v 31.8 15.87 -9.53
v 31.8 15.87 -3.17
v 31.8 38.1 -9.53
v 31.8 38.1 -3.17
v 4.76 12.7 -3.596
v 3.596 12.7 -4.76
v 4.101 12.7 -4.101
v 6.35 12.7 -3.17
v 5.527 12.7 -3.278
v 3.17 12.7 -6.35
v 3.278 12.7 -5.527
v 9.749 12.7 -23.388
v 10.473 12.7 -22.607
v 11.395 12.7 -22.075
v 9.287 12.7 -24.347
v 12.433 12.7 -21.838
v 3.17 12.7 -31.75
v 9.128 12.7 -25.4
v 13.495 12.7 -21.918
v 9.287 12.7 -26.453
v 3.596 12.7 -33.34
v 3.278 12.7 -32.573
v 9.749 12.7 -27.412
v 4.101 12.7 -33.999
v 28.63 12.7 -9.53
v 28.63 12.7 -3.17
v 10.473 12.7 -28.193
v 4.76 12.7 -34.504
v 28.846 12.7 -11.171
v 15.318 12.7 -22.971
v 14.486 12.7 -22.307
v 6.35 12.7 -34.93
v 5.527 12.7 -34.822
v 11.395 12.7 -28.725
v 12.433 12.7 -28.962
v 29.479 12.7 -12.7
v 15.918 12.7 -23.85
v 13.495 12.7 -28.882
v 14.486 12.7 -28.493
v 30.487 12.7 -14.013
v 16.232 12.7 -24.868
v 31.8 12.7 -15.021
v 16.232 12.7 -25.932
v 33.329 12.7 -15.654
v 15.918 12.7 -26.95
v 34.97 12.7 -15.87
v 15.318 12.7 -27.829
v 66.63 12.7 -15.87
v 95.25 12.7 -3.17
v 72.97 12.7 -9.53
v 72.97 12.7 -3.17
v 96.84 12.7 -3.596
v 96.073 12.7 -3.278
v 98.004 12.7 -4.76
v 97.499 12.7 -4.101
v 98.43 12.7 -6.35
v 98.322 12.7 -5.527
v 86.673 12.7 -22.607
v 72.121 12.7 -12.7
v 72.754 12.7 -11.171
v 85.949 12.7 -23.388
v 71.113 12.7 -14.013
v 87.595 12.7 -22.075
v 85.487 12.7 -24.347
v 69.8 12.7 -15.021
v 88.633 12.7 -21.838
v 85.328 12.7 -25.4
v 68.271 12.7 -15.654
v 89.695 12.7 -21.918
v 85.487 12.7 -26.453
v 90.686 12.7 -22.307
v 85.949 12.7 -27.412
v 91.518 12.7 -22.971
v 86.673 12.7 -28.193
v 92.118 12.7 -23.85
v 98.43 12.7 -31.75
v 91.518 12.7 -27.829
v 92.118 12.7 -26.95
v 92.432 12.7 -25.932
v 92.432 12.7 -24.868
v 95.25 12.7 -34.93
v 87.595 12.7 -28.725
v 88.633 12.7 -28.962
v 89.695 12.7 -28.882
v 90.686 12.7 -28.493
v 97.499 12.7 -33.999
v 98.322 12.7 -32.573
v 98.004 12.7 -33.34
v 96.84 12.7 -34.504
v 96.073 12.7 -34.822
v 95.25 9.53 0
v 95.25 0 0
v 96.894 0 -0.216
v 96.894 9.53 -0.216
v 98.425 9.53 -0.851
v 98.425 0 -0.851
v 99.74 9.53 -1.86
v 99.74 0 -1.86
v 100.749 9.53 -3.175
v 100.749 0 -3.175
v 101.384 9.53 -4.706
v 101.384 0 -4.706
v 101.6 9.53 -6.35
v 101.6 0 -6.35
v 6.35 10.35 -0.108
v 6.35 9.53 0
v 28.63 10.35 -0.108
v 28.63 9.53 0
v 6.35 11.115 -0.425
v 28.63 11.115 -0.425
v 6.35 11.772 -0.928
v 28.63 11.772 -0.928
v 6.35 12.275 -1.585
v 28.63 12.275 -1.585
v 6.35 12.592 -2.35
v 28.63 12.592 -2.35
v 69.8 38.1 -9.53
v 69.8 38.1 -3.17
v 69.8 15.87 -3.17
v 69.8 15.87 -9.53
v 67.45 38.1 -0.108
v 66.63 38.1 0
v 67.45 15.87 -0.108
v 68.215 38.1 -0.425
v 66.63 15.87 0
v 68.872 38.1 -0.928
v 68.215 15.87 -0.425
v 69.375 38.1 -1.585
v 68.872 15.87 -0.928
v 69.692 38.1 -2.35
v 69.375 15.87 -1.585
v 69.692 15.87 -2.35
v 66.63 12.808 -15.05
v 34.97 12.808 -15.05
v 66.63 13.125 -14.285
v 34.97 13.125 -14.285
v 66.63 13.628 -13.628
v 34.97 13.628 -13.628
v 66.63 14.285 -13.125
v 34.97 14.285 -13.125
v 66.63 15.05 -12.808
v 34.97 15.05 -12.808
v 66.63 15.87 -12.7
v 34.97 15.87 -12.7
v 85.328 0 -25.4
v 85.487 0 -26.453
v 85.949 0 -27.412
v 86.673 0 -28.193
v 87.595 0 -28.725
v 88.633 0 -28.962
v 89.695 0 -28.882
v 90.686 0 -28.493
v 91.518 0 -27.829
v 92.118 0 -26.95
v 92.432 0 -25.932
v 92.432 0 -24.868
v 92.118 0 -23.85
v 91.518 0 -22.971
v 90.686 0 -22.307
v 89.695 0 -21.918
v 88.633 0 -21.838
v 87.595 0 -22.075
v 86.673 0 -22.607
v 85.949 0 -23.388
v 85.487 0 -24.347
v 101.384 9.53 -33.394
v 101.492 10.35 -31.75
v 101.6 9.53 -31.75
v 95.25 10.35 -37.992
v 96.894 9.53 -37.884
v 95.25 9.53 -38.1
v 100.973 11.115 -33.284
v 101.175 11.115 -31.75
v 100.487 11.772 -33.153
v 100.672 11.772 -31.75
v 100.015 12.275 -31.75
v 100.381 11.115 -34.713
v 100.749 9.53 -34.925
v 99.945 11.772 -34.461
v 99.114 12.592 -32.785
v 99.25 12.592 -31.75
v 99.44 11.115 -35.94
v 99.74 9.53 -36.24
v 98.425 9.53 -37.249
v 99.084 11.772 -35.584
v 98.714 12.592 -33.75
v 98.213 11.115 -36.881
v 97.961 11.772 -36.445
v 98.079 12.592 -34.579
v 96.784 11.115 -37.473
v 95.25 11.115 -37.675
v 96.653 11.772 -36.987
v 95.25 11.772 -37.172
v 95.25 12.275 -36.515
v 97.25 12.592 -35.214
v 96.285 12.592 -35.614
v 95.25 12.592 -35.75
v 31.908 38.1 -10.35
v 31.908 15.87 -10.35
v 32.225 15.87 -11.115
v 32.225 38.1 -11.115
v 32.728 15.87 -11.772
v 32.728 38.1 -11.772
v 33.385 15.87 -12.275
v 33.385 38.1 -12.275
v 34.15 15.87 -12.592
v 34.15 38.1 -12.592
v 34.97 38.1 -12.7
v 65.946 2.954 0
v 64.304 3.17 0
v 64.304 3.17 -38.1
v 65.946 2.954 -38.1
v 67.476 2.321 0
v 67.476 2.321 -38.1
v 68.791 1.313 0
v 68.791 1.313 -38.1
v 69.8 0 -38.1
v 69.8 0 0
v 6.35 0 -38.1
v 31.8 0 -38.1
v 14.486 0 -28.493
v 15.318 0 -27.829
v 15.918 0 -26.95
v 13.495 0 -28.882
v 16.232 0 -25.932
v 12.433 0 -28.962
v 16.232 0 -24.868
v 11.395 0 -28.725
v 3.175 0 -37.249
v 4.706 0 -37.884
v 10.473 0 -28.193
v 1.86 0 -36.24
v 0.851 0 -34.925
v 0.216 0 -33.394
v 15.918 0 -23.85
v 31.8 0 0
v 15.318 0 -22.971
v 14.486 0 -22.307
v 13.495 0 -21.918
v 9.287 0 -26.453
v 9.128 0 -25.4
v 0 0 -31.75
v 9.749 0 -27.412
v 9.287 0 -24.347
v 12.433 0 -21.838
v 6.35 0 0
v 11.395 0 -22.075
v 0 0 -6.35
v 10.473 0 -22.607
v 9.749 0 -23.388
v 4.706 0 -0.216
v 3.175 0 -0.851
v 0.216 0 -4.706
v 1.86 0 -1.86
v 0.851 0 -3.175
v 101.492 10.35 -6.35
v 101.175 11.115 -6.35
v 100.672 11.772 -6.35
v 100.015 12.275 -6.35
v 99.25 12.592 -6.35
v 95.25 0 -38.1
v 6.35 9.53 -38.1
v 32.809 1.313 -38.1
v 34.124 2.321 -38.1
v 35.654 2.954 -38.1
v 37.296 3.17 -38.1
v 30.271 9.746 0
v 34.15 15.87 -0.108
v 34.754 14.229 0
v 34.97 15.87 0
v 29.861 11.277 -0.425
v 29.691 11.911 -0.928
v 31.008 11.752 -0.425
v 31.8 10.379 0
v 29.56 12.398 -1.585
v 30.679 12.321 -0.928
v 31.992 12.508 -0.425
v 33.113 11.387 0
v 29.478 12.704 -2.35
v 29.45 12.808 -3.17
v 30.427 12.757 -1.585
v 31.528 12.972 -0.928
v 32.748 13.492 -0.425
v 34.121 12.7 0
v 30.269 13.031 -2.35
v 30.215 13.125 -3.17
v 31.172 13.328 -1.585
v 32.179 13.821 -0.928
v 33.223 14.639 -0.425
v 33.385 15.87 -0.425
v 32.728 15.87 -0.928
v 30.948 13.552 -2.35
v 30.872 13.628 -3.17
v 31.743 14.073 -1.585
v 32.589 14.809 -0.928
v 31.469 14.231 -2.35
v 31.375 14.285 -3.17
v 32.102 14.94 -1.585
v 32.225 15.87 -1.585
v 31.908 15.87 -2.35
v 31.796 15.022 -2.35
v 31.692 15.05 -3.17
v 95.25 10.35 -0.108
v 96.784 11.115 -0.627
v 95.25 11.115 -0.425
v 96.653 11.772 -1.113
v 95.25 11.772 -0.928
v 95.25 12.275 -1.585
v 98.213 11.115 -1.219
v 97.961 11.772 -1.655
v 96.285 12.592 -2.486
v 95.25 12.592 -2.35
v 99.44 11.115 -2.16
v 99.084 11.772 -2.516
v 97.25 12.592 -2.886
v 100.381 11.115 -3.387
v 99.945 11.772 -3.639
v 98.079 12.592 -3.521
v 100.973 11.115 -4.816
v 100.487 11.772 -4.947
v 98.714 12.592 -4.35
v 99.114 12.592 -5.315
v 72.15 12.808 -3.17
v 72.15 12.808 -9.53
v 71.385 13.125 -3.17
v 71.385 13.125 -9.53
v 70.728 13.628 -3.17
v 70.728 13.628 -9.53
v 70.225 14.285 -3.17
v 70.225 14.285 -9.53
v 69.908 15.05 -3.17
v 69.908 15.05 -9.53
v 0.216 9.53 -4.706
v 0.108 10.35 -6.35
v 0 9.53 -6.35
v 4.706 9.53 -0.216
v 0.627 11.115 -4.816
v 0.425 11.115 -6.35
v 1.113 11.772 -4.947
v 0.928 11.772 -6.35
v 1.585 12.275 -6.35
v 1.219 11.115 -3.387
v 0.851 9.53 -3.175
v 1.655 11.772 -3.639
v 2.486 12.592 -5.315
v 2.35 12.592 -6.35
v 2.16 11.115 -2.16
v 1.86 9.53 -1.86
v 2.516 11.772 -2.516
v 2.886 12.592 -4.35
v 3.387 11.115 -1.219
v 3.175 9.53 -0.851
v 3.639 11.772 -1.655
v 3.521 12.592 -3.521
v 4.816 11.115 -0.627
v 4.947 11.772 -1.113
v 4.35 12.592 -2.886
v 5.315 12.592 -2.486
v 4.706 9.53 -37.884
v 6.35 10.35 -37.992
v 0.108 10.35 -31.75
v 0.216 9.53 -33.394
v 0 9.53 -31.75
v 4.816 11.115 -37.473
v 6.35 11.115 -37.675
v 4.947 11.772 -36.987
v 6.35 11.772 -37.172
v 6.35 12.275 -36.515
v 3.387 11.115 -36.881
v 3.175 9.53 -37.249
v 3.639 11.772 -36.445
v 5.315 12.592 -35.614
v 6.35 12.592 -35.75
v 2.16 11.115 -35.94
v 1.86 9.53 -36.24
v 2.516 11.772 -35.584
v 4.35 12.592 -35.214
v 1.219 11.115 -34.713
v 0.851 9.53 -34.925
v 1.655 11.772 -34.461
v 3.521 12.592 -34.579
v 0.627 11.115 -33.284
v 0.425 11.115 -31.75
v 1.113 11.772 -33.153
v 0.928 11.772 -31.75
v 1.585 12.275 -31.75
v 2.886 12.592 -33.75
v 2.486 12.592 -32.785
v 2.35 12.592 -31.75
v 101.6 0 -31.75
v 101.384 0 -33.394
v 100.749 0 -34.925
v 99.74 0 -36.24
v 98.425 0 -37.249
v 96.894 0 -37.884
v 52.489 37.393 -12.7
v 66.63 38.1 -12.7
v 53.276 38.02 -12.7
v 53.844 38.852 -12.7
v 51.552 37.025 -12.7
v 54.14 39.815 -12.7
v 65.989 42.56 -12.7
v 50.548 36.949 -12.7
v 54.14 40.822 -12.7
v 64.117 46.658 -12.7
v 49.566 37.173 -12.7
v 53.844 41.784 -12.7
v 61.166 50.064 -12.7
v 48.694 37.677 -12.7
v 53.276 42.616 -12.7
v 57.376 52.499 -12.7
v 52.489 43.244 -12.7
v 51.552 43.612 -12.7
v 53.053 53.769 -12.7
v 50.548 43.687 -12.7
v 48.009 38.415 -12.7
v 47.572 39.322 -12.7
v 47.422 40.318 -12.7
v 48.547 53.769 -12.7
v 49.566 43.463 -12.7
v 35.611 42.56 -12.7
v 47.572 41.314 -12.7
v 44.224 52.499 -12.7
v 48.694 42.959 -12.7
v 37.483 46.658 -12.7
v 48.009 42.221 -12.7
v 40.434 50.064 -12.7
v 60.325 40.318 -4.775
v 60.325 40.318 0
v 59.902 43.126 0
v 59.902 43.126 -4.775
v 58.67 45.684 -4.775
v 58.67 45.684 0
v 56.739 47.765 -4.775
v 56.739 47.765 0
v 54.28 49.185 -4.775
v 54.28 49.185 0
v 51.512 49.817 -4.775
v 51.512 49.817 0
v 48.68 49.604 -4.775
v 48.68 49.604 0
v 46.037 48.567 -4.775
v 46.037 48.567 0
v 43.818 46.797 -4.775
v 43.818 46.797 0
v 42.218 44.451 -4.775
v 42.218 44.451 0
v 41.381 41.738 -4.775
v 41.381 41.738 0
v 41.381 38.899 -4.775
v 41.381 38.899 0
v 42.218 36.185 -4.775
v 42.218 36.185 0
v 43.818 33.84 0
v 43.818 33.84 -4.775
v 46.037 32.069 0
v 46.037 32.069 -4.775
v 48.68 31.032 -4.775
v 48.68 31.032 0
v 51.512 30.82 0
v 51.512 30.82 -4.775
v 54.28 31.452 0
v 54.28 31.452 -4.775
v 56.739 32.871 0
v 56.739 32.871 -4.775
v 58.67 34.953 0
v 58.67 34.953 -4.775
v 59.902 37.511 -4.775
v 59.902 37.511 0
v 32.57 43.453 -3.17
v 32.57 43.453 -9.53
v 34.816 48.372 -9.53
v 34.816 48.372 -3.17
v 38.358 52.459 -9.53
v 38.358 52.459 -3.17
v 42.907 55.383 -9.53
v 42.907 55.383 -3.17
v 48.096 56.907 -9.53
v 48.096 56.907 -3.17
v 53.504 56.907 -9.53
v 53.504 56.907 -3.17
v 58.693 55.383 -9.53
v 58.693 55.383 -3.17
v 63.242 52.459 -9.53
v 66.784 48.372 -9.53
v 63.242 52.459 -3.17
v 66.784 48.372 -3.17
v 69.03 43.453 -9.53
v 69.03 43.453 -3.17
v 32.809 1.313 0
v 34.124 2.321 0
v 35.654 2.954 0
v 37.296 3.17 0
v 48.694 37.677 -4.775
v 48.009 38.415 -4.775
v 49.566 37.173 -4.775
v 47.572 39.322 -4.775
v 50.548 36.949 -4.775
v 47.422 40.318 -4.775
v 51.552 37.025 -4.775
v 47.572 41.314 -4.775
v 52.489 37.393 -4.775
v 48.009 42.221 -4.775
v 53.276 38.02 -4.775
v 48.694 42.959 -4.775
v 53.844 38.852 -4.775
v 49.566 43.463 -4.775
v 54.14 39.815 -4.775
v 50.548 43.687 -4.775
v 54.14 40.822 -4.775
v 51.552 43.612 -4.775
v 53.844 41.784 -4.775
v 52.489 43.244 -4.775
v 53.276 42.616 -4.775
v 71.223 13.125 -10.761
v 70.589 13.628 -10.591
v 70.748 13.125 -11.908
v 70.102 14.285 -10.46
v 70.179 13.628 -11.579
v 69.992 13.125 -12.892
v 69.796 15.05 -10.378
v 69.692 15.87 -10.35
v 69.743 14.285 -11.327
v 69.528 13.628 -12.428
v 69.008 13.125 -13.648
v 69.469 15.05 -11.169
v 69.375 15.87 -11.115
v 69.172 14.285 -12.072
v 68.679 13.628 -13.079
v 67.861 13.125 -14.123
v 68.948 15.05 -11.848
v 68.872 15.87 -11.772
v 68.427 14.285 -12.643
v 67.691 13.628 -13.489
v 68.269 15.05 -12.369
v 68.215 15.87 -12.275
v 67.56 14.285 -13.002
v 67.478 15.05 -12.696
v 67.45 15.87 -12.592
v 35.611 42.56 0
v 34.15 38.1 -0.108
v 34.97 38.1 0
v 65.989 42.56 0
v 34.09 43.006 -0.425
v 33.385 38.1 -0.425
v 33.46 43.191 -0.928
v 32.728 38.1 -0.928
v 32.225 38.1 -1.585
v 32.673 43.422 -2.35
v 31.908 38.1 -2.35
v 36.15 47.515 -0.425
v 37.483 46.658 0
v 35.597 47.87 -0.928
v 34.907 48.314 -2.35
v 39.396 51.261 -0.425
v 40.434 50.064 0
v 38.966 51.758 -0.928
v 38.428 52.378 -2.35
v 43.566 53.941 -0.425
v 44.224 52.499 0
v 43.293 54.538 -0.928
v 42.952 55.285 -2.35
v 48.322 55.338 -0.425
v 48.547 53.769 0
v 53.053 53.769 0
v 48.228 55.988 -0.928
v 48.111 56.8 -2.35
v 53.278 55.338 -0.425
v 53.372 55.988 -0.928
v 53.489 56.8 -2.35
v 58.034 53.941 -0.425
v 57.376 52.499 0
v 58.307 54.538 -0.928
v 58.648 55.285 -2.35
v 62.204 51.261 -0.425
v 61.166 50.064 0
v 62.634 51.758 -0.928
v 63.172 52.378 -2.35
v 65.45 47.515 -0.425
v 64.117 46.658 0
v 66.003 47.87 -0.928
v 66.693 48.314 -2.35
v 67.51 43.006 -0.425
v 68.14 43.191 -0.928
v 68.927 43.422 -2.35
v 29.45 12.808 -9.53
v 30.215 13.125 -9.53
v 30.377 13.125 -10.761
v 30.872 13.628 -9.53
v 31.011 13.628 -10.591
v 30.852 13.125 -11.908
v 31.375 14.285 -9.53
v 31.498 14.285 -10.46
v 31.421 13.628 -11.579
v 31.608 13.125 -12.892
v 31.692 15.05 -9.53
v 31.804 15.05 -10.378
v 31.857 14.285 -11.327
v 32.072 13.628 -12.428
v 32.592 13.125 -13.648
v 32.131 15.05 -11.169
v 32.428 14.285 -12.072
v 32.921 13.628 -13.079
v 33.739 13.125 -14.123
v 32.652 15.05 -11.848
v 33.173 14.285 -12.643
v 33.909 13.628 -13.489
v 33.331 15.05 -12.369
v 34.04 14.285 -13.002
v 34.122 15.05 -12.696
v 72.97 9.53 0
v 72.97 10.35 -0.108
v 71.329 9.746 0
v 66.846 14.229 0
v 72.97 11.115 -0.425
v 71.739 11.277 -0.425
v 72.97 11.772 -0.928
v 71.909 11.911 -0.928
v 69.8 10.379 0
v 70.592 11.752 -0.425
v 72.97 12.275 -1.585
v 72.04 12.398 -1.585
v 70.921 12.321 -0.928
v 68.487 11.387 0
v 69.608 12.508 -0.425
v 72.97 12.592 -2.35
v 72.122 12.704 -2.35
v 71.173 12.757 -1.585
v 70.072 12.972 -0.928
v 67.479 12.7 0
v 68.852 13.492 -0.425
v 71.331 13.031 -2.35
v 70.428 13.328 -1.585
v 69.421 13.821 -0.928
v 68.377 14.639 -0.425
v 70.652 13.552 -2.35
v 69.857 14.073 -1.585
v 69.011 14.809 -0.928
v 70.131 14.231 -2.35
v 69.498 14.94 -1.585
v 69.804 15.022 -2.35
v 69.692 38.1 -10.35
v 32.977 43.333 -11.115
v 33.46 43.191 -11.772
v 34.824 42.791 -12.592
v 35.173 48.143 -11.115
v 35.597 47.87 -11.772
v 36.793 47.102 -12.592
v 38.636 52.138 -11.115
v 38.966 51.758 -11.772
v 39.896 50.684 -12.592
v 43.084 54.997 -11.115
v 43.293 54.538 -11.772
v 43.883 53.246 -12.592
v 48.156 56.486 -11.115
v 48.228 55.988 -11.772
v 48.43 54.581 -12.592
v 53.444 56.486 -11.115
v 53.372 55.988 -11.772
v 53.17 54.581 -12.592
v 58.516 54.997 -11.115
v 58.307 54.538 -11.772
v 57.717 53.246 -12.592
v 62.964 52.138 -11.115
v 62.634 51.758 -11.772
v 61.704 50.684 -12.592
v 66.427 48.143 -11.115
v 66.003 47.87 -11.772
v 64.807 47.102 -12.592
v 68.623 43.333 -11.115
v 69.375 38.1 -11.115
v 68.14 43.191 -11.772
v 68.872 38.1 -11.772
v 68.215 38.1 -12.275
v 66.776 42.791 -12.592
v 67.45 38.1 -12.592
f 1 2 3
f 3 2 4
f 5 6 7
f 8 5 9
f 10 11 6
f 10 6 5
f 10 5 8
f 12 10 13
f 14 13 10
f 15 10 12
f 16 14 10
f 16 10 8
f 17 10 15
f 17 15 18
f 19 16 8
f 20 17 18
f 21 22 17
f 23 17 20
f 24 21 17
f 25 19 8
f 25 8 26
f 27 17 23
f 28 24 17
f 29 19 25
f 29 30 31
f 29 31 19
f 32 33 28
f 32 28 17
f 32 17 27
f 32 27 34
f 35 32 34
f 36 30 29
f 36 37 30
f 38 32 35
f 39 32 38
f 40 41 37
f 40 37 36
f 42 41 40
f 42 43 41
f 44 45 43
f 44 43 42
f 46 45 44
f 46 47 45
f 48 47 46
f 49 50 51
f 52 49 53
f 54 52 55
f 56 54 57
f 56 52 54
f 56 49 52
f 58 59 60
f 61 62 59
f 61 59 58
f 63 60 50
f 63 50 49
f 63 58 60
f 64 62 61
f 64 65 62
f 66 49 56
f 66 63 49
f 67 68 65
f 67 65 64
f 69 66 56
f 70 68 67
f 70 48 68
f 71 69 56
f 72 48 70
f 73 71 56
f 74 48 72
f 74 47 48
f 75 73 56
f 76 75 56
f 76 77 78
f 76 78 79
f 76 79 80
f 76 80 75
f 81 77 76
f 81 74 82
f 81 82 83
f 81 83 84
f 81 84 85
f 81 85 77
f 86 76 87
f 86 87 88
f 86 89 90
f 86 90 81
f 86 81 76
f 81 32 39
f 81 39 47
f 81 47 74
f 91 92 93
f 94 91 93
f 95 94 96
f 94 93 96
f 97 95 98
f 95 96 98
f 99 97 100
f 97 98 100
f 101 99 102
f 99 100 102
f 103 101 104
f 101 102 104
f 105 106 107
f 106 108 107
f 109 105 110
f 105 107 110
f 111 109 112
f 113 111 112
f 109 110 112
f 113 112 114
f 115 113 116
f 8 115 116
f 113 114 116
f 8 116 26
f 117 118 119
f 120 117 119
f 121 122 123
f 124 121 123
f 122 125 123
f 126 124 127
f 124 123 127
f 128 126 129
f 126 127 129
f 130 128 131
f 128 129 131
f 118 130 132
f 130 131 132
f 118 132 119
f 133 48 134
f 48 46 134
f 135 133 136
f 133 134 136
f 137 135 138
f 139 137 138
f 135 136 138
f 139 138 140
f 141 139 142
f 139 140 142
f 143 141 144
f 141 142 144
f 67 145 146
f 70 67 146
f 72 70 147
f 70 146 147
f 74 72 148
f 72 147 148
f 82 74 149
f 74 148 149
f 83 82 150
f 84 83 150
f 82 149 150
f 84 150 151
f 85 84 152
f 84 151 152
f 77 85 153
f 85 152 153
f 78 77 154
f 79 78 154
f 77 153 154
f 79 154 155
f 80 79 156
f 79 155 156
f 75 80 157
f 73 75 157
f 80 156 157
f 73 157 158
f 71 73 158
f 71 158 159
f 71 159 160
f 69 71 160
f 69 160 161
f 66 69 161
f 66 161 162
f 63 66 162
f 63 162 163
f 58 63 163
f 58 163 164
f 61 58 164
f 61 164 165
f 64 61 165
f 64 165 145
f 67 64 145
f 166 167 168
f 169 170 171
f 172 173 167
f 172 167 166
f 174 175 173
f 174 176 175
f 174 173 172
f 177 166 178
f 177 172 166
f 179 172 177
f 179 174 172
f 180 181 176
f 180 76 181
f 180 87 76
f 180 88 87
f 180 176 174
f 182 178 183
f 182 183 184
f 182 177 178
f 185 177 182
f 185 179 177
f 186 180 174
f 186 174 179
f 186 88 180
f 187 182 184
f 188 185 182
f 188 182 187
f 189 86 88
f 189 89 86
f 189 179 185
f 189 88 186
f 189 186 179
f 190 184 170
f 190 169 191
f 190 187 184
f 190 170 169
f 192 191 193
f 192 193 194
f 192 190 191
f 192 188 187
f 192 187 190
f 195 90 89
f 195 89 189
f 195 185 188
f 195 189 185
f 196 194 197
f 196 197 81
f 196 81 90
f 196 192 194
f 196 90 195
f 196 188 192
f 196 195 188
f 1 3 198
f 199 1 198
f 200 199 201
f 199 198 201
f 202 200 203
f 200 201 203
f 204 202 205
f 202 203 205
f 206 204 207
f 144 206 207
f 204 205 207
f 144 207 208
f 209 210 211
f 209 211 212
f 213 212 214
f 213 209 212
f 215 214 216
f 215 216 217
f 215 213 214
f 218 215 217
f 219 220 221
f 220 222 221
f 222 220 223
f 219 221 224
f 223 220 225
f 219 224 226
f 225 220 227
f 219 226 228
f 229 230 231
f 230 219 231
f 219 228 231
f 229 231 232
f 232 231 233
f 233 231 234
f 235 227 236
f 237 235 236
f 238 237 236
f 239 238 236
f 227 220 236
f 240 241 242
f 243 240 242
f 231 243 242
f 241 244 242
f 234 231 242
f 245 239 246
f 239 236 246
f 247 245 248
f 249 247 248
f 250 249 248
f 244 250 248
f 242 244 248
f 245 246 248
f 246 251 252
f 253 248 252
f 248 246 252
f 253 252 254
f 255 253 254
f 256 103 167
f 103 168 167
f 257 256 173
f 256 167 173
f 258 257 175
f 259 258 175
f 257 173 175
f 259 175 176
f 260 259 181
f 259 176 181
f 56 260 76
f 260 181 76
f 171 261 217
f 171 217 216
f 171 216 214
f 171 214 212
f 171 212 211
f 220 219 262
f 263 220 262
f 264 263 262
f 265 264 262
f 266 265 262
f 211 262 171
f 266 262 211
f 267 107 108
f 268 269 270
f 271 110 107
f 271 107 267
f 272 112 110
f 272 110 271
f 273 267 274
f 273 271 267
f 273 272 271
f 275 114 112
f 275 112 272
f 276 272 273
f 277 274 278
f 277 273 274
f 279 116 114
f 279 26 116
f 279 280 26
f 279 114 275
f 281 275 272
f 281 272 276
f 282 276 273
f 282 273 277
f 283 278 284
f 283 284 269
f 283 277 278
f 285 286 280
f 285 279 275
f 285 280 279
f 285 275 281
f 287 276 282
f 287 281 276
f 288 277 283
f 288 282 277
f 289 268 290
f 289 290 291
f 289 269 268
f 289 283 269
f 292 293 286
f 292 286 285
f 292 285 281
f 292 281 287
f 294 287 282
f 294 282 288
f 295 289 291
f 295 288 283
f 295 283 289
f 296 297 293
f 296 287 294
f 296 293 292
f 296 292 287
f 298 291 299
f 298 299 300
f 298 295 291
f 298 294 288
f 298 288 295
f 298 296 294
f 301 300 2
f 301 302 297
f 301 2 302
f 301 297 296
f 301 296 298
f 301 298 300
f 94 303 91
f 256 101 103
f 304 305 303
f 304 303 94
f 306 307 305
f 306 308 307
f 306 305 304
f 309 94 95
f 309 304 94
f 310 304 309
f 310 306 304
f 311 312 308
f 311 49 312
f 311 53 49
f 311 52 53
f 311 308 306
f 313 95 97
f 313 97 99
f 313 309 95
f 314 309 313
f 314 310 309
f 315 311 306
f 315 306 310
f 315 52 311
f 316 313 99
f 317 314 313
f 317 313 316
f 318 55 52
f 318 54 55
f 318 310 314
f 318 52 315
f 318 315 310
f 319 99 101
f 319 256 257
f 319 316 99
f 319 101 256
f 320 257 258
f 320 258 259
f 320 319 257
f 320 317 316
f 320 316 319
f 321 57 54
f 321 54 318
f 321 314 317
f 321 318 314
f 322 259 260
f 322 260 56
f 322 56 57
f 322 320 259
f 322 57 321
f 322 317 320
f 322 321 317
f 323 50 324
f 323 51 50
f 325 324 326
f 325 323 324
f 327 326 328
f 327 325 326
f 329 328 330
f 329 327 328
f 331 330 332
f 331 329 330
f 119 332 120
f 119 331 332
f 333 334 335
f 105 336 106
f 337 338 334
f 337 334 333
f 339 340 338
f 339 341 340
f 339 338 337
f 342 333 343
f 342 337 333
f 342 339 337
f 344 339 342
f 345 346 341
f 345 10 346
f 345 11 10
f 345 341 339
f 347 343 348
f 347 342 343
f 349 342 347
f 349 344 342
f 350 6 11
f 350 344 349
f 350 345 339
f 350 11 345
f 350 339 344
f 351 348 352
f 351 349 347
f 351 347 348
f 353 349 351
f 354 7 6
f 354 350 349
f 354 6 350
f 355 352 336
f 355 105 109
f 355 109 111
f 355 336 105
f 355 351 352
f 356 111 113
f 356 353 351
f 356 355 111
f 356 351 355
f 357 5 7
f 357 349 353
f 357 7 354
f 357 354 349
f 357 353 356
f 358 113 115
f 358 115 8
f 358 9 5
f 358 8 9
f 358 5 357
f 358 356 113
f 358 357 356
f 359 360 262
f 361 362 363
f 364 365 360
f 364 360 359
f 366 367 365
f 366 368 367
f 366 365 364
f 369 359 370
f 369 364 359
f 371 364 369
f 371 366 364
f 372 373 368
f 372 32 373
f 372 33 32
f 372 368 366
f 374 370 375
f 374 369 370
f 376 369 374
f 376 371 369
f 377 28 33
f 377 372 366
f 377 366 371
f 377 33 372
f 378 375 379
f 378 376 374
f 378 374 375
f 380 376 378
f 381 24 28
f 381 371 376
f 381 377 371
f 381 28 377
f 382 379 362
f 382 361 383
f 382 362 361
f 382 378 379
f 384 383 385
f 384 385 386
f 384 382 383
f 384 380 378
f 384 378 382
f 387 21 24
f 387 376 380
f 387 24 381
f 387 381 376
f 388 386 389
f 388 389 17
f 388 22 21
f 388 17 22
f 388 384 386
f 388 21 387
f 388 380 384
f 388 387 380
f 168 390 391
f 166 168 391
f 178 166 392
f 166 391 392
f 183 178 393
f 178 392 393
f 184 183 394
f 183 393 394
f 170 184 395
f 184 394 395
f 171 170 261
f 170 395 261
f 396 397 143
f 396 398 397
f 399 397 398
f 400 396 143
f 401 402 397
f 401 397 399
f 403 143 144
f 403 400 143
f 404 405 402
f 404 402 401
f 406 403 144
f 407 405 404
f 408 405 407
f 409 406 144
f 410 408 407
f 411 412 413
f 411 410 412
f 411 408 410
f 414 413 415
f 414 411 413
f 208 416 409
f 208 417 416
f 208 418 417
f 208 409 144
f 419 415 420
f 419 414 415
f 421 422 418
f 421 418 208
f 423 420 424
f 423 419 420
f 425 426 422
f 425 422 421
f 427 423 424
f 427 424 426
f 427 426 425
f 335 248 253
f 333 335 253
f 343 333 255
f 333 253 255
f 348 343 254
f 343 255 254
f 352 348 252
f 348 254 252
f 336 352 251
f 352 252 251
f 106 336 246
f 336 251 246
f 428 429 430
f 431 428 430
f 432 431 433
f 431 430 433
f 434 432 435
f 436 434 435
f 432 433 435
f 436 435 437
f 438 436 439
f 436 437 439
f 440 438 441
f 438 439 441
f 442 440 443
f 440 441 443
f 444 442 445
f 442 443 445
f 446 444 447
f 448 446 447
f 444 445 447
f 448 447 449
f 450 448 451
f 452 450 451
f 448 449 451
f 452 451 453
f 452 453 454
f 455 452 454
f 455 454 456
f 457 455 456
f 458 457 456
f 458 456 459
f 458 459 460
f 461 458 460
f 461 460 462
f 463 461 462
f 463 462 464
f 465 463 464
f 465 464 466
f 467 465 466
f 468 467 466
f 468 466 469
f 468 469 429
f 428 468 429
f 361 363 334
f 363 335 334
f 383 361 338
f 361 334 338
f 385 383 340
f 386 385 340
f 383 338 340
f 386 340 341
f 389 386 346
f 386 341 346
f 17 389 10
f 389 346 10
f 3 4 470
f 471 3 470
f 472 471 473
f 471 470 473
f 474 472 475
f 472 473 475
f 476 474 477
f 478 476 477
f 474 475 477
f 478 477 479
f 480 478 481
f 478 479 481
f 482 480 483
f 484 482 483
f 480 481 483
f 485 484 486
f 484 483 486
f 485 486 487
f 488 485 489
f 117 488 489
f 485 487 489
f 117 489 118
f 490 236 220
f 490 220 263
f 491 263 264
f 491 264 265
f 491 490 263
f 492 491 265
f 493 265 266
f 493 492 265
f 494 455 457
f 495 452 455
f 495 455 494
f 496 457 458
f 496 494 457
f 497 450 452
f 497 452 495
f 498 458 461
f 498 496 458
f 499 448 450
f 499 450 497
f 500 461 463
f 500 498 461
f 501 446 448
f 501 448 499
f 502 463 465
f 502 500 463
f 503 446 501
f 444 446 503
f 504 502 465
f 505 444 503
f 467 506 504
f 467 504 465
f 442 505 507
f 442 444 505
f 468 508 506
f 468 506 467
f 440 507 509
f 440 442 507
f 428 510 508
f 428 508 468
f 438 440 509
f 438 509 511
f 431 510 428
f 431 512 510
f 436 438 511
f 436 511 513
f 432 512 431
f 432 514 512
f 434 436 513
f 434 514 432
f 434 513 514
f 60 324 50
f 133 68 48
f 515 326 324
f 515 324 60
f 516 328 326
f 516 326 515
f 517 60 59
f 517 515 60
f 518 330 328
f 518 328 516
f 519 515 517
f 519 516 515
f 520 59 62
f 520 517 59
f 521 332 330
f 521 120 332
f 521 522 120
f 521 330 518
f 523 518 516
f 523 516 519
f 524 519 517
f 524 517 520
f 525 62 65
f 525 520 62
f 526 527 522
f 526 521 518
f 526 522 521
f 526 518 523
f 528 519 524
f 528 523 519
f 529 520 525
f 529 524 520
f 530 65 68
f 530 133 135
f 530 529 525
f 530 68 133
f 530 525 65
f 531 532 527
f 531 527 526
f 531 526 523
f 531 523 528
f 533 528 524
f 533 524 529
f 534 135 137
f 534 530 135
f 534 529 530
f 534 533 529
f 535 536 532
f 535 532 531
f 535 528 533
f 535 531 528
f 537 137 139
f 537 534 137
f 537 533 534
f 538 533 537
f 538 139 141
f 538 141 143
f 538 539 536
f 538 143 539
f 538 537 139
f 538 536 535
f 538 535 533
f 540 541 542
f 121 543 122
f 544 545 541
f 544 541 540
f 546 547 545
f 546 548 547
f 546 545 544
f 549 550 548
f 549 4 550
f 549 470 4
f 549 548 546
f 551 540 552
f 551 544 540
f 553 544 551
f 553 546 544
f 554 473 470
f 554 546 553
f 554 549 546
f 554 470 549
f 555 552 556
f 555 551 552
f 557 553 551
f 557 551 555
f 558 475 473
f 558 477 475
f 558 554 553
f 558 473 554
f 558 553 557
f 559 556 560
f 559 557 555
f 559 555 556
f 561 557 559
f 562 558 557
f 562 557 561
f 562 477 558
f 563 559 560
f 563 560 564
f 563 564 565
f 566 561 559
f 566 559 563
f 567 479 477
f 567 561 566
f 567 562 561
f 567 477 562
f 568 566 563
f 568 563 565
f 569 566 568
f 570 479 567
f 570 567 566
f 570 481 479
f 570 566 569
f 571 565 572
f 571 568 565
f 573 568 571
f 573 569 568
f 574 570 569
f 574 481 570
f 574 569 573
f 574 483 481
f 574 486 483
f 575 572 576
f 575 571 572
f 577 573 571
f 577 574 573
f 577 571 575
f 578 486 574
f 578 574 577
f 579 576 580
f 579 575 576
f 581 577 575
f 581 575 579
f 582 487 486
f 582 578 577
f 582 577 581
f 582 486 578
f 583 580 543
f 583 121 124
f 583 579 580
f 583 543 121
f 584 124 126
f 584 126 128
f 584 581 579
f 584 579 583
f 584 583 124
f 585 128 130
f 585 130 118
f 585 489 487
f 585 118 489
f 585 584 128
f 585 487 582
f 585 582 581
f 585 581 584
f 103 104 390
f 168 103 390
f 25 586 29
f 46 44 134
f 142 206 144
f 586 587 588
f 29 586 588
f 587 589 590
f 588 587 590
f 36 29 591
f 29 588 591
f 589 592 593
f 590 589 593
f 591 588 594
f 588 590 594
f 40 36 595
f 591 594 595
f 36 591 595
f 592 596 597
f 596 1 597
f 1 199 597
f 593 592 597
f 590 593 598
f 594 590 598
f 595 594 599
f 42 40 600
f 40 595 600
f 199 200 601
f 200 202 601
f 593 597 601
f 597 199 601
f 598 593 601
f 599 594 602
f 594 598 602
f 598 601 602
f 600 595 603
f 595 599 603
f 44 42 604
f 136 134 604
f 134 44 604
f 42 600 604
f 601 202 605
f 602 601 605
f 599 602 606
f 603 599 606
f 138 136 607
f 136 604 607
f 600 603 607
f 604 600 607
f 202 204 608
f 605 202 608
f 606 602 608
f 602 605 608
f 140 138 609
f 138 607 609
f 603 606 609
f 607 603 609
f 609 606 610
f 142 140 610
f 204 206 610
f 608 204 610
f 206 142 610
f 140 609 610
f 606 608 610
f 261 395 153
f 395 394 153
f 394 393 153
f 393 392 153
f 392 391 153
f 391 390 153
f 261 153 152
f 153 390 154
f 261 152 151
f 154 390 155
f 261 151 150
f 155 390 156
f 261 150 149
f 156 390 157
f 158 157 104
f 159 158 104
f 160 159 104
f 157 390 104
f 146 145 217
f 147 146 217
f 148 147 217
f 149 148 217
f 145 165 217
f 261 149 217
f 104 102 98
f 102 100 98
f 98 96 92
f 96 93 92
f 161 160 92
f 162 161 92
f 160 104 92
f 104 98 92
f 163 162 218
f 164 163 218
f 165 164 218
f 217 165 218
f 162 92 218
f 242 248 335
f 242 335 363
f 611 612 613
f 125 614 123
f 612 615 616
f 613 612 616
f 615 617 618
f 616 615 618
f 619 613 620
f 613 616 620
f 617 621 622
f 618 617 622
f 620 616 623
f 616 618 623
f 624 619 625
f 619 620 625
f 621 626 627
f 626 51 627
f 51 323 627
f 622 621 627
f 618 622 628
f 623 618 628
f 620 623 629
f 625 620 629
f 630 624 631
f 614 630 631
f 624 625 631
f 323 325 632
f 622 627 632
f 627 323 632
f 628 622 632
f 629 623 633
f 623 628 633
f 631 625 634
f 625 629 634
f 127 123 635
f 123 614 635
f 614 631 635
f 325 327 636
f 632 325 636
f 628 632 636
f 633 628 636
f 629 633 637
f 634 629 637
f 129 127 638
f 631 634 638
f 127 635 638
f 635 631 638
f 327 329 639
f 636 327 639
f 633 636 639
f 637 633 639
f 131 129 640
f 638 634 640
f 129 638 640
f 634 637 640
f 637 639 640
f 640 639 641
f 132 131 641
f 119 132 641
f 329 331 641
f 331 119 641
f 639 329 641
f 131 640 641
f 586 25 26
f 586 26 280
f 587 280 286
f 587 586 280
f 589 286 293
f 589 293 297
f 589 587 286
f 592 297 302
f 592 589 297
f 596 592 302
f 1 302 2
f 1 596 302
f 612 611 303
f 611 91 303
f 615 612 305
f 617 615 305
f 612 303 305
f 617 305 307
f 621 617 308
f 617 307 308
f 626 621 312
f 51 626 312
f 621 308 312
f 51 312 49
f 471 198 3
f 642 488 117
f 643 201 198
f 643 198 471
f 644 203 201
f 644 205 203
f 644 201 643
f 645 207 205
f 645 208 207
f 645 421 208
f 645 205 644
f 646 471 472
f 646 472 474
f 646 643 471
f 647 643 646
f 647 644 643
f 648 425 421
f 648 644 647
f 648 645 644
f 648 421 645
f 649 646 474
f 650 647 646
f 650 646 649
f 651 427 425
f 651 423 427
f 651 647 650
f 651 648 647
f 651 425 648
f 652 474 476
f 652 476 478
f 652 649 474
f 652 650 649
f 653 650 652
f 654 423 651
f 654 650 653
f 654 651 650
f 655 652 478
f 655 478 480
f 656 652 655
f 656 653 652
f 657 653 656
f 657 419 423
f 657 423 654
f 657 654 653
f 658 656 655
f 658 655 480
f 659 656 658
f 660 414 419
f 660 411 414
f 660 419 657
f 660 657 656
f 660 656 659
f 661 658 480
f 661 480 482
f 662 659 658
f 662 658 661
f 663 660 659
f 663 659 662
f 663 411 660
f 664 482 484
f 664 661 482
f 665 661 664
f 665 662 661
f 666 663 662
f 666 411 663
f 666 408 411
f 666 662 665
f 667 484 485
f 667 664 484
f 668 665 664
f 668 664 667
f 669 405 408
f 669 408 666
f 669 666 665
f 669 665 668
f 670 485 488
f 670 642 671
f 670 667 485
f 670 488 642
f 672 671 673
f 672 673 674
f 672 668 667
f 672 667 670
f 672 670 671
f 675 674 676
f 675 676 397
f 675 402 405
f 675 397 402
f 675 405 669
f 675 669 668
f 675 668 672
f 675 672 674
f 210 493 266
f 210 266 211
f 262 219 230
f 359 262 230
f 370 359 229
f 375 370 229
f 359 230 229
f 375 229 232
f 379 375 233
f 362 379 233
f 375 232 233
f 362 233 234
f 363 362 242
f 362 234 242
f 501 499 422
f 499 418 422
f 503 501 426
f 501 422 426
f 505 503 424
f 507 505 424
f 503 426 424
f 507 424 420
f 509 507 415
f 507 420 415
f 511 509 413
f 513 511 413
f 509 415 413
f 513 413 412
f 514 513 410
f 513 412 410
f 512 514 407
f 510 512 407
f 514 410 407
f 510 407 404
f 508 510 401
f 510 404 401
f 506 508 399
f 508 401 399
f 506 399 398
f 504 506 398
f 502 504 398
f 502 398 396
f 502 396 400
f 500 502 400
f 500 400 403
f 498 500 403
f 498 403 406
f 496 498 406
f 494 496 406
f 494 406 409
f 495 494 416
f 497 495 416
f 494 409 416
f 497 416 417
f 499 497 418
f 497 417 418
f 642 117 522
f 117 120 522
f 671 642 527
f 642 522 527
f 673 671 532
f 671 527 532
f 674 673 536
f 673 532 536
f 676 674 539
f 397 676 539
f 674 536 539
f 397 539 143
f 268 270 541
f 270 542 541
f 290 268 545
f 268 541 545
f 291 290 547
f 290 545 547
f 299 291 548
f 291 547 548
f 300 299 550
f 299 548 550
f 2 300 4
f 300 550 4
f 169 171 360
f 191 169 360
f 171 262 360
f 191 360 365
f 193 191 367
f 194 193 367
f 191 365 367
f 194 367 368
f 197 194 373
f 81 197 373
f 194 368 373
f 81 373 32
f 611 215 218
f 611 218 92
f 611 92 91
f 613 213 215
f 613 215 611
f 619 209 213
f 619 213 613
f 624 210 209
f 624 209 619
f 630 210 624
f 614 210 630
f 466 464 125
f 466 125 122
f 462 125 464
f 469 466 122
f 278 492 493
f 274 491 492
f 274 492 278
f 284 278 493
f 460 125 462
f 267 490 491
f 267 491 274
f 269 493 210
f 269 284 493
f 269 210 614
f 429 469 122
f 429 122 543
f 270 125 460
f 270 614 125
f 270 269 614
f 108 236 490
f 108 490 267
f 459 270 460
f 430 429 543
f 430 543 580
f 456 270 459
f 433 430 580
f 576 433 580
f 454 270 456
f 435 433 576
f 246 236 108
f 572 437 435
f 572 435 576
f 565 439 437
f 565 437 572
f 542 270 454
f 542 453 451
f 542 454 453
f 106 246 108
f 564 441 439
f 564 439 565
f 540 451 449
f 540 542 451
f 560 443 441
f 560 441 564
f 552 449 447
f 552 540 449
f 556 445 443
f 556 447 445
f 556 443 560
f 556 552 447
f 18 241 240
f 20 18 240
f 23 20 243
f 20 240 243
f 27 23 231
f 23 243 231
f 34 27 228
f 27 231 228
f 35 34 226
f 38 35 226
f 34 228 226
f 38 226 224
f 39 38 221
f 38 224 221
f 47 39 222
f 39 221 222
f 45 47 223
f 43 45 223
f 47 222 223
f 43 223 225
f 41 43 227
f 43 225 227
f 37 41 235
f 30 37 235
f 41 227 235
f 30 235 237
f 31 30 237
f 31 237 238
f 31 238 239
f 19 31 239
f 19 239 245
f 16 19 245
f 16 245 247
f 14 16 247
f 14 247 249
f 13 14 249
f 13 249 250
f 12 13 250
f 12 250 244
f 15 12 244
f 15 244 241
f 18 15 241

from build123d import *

# Parameters (mm, degrees)
SKETCH1_W                                = 101.6
SKETCH1_H                                = 38.1
BASEPLATE_DEPTH                          = 12.7
VERTBOSS_DEPTH                           = 12.7
F_9_32_0_28125_DIAMETER_HOLE1_D          = 7.14375
CBORE_FOR_1_4_HEX_HEAD_BOLT1_D           = 6.7564
CBORE_FOR_1_4_HEX_HEAD_BOLT1_CBORE_D     = 19.05
CBORE_FOR_1_4_HEX_HEAD_BOLT1_CBORE_DEPTH = 4.7752
SKETCH11_W                               = 38
SKETCH11_H                               = 3.17
BOTTOMSLOT_DEPTH                         = 123.615578129
FILLET1_R                                = 6.35
FILLET2_R                                = 3.17


with BuildPart() as part:
    # Sketch1 → BasePlate (new body)
    with BuildSketch(Plane(origin=(0, 0, 0), x_dir=(1, 0, 0), z_dir=(0, 1, 0))):
        with Locations((50.8, 19.05)):
            Rectangle(SKETCH1_W, SKETCH1_H)
    extrude(amount=BASEPLATE_DEPTH)

    # Sketch3 → VertBoss (add)
    with BuildSketch(Plane.XY):
        with BuildLine():
            Line((31.8, 0), (31.8, 38.1))
            ThreePointArc((31.8, 38.1), (50.8, 57.1), (69.8, 38.1))
            Line((69.8, 38.1), (69.8, 0))
            Line((69.8, 0), (31.8, 0))
        make_face()
    extrude(amount=-VERTBOSS_DEPTH)

    # 9/32 (0.28125) Diameter Hole1 (through all)
    with Locations(Plane(origin=(0, 12.7, 0), x_dir=(1, 0, 0), z_dir=(0, 1, 0))):
        with Locations((88.9, 25.4), (12.7, 25.4)):
            Hole(F_9_32_0_28125_DIAMETER_HOLE1_D / 2)

    # CBORE for 1/4 Hex Head Bolt1 (through all)
    with Locations(Plane.XY):
        with Locations((50.8, 40.318171365)):
            CounterBoreHole(CBORE_FOR_1_4_HEX_HEAD_BOLT1_D / 2, CBORE_FOR_1_4_HEX_HEAD_BOLT1_CBORE_D / 2, CBORE_FOR_1_4_HEX_HEAD_BOLT1_CBORE_DEPTH)

    # Sketch11 → BottomSlot (cut, through all)
    with BuildSketch(Plane.XY):
        with Locations((50.8, 1.585)):
            Rectangle(SKETCH11_W, SKETCH11_H)
    extrude(amount=-BOTTOMSLOT_DEPTH, mode=Mode.SUBTRACT)

    # Fillet1
    # the kernel refuses this fillet: 6.35 mm, written as the material it adds along each edge
    with BuildSketch(Plane(origin=(69.8, 3.17, 0), x_dir=(-1, 0, 0), z_dir=(0, 0, -1))) as fillet1_piece_1:
        with BuildLine():
            CenterArc((5.49637153, -6.35), FILLET1_R, 90, 59.947892244)
            Line((0, -3.17), (0, 0))
            Line((0, 0), (5.49637153, 0))
        make_face()
    extrude(amount=38.1)
    with BuildSketch(Plane(origin=(31.8, 3.17, 0), x_dir=(0, -1, 0), z_dir=(0, 0, -1))) as fillet1_piece_2:
        with BuildLine():
            CenterArc((6.35, -5.49637153), FILLET1_R, 120.052107756, 59.947892244)
            Line((0, -5.49637153), (0, 0))
            Line((0, 0), (3.17, 0))
        make_face()
    extrude(amount=38.1)
    # the kernel refuses this fillet: 6.35 mm, written as the material it takes off along each edge
    with BuildSketch(Plane(origin=(0, -15.875, -38.1), x_dir=(0, 0, 1), z_dir=(0, 1, 0)), Plane(origin=(0, -15.875, 0), x_dir=(1, 0, 0), z_dir=(0, 1, 0))) as fillet1_2_piece_1:
        with BuildLine():
            CenterArc((FILLET1_R, FILLET1_R), FILLET1_R, 180, 90)
            Line((0, FILLET1_R), (0, 0))
            Line((0, 0), (FILLET1_R, 0))
        make_face()
    extrude(amount=44.45, mode=Mode.SUBTRACT)
    with BuildSketch(Plane(origin=(101.6, -15.875, -38.1), x_dir=(0, 0, 1), z_dir=(0, 1, 0)), Plane(origin=(101.6, -15.875, 0), x_dir=(-1, 0, 0), z_dir=(0, 1, 0))) as fillet1_2_piece_2:
        with BuildLine():
            CenterArc((FILLET1_R, -FILLET1_R), FILLET1_R, 90, 90)
            Line((0, -FILLET1_R), (0, 0))
            Line((0, 0), (FILLET1_R, 0))
        make_face()
    extrude(amount=44.45, mode=Mode.SUBTRACT)

    # Fillet2
    fillet2_edges = [part.edges().sort_by_distance(p)[0] for p in [
        (82.525, 12.7, 0),
        (31.8, 25.4, -12.7),
        (69.8, 25.4, -12.7),
        (31.8, 25.4, 0),
        (69.8, 25.4, 0),
        (50.8, 57.1, 0),
        (31.8, 12.7, -6.35),
        (50.8, 57.1, -12.7),
        (69.8, 12.7, -6.35),
        (50.8, 12.7, -12.7),
        (0, 12.7, -19.05),
        (50.8, 12.7, -38.1),
        (19.075, 12.7, 0),
        (101.6, 12.7, -19.05),
        (99.740128061, 12.7, -1.859871939),
        (99.740128061, 12.7, -36.240128061),
        (1.859871939, 12.7, -1.859871939),
        (1.859871939, 12.7, -36.240128061),
    ]]
    fillet(fillet2_edges, radius=FILLET2_R)


solid = part.part
